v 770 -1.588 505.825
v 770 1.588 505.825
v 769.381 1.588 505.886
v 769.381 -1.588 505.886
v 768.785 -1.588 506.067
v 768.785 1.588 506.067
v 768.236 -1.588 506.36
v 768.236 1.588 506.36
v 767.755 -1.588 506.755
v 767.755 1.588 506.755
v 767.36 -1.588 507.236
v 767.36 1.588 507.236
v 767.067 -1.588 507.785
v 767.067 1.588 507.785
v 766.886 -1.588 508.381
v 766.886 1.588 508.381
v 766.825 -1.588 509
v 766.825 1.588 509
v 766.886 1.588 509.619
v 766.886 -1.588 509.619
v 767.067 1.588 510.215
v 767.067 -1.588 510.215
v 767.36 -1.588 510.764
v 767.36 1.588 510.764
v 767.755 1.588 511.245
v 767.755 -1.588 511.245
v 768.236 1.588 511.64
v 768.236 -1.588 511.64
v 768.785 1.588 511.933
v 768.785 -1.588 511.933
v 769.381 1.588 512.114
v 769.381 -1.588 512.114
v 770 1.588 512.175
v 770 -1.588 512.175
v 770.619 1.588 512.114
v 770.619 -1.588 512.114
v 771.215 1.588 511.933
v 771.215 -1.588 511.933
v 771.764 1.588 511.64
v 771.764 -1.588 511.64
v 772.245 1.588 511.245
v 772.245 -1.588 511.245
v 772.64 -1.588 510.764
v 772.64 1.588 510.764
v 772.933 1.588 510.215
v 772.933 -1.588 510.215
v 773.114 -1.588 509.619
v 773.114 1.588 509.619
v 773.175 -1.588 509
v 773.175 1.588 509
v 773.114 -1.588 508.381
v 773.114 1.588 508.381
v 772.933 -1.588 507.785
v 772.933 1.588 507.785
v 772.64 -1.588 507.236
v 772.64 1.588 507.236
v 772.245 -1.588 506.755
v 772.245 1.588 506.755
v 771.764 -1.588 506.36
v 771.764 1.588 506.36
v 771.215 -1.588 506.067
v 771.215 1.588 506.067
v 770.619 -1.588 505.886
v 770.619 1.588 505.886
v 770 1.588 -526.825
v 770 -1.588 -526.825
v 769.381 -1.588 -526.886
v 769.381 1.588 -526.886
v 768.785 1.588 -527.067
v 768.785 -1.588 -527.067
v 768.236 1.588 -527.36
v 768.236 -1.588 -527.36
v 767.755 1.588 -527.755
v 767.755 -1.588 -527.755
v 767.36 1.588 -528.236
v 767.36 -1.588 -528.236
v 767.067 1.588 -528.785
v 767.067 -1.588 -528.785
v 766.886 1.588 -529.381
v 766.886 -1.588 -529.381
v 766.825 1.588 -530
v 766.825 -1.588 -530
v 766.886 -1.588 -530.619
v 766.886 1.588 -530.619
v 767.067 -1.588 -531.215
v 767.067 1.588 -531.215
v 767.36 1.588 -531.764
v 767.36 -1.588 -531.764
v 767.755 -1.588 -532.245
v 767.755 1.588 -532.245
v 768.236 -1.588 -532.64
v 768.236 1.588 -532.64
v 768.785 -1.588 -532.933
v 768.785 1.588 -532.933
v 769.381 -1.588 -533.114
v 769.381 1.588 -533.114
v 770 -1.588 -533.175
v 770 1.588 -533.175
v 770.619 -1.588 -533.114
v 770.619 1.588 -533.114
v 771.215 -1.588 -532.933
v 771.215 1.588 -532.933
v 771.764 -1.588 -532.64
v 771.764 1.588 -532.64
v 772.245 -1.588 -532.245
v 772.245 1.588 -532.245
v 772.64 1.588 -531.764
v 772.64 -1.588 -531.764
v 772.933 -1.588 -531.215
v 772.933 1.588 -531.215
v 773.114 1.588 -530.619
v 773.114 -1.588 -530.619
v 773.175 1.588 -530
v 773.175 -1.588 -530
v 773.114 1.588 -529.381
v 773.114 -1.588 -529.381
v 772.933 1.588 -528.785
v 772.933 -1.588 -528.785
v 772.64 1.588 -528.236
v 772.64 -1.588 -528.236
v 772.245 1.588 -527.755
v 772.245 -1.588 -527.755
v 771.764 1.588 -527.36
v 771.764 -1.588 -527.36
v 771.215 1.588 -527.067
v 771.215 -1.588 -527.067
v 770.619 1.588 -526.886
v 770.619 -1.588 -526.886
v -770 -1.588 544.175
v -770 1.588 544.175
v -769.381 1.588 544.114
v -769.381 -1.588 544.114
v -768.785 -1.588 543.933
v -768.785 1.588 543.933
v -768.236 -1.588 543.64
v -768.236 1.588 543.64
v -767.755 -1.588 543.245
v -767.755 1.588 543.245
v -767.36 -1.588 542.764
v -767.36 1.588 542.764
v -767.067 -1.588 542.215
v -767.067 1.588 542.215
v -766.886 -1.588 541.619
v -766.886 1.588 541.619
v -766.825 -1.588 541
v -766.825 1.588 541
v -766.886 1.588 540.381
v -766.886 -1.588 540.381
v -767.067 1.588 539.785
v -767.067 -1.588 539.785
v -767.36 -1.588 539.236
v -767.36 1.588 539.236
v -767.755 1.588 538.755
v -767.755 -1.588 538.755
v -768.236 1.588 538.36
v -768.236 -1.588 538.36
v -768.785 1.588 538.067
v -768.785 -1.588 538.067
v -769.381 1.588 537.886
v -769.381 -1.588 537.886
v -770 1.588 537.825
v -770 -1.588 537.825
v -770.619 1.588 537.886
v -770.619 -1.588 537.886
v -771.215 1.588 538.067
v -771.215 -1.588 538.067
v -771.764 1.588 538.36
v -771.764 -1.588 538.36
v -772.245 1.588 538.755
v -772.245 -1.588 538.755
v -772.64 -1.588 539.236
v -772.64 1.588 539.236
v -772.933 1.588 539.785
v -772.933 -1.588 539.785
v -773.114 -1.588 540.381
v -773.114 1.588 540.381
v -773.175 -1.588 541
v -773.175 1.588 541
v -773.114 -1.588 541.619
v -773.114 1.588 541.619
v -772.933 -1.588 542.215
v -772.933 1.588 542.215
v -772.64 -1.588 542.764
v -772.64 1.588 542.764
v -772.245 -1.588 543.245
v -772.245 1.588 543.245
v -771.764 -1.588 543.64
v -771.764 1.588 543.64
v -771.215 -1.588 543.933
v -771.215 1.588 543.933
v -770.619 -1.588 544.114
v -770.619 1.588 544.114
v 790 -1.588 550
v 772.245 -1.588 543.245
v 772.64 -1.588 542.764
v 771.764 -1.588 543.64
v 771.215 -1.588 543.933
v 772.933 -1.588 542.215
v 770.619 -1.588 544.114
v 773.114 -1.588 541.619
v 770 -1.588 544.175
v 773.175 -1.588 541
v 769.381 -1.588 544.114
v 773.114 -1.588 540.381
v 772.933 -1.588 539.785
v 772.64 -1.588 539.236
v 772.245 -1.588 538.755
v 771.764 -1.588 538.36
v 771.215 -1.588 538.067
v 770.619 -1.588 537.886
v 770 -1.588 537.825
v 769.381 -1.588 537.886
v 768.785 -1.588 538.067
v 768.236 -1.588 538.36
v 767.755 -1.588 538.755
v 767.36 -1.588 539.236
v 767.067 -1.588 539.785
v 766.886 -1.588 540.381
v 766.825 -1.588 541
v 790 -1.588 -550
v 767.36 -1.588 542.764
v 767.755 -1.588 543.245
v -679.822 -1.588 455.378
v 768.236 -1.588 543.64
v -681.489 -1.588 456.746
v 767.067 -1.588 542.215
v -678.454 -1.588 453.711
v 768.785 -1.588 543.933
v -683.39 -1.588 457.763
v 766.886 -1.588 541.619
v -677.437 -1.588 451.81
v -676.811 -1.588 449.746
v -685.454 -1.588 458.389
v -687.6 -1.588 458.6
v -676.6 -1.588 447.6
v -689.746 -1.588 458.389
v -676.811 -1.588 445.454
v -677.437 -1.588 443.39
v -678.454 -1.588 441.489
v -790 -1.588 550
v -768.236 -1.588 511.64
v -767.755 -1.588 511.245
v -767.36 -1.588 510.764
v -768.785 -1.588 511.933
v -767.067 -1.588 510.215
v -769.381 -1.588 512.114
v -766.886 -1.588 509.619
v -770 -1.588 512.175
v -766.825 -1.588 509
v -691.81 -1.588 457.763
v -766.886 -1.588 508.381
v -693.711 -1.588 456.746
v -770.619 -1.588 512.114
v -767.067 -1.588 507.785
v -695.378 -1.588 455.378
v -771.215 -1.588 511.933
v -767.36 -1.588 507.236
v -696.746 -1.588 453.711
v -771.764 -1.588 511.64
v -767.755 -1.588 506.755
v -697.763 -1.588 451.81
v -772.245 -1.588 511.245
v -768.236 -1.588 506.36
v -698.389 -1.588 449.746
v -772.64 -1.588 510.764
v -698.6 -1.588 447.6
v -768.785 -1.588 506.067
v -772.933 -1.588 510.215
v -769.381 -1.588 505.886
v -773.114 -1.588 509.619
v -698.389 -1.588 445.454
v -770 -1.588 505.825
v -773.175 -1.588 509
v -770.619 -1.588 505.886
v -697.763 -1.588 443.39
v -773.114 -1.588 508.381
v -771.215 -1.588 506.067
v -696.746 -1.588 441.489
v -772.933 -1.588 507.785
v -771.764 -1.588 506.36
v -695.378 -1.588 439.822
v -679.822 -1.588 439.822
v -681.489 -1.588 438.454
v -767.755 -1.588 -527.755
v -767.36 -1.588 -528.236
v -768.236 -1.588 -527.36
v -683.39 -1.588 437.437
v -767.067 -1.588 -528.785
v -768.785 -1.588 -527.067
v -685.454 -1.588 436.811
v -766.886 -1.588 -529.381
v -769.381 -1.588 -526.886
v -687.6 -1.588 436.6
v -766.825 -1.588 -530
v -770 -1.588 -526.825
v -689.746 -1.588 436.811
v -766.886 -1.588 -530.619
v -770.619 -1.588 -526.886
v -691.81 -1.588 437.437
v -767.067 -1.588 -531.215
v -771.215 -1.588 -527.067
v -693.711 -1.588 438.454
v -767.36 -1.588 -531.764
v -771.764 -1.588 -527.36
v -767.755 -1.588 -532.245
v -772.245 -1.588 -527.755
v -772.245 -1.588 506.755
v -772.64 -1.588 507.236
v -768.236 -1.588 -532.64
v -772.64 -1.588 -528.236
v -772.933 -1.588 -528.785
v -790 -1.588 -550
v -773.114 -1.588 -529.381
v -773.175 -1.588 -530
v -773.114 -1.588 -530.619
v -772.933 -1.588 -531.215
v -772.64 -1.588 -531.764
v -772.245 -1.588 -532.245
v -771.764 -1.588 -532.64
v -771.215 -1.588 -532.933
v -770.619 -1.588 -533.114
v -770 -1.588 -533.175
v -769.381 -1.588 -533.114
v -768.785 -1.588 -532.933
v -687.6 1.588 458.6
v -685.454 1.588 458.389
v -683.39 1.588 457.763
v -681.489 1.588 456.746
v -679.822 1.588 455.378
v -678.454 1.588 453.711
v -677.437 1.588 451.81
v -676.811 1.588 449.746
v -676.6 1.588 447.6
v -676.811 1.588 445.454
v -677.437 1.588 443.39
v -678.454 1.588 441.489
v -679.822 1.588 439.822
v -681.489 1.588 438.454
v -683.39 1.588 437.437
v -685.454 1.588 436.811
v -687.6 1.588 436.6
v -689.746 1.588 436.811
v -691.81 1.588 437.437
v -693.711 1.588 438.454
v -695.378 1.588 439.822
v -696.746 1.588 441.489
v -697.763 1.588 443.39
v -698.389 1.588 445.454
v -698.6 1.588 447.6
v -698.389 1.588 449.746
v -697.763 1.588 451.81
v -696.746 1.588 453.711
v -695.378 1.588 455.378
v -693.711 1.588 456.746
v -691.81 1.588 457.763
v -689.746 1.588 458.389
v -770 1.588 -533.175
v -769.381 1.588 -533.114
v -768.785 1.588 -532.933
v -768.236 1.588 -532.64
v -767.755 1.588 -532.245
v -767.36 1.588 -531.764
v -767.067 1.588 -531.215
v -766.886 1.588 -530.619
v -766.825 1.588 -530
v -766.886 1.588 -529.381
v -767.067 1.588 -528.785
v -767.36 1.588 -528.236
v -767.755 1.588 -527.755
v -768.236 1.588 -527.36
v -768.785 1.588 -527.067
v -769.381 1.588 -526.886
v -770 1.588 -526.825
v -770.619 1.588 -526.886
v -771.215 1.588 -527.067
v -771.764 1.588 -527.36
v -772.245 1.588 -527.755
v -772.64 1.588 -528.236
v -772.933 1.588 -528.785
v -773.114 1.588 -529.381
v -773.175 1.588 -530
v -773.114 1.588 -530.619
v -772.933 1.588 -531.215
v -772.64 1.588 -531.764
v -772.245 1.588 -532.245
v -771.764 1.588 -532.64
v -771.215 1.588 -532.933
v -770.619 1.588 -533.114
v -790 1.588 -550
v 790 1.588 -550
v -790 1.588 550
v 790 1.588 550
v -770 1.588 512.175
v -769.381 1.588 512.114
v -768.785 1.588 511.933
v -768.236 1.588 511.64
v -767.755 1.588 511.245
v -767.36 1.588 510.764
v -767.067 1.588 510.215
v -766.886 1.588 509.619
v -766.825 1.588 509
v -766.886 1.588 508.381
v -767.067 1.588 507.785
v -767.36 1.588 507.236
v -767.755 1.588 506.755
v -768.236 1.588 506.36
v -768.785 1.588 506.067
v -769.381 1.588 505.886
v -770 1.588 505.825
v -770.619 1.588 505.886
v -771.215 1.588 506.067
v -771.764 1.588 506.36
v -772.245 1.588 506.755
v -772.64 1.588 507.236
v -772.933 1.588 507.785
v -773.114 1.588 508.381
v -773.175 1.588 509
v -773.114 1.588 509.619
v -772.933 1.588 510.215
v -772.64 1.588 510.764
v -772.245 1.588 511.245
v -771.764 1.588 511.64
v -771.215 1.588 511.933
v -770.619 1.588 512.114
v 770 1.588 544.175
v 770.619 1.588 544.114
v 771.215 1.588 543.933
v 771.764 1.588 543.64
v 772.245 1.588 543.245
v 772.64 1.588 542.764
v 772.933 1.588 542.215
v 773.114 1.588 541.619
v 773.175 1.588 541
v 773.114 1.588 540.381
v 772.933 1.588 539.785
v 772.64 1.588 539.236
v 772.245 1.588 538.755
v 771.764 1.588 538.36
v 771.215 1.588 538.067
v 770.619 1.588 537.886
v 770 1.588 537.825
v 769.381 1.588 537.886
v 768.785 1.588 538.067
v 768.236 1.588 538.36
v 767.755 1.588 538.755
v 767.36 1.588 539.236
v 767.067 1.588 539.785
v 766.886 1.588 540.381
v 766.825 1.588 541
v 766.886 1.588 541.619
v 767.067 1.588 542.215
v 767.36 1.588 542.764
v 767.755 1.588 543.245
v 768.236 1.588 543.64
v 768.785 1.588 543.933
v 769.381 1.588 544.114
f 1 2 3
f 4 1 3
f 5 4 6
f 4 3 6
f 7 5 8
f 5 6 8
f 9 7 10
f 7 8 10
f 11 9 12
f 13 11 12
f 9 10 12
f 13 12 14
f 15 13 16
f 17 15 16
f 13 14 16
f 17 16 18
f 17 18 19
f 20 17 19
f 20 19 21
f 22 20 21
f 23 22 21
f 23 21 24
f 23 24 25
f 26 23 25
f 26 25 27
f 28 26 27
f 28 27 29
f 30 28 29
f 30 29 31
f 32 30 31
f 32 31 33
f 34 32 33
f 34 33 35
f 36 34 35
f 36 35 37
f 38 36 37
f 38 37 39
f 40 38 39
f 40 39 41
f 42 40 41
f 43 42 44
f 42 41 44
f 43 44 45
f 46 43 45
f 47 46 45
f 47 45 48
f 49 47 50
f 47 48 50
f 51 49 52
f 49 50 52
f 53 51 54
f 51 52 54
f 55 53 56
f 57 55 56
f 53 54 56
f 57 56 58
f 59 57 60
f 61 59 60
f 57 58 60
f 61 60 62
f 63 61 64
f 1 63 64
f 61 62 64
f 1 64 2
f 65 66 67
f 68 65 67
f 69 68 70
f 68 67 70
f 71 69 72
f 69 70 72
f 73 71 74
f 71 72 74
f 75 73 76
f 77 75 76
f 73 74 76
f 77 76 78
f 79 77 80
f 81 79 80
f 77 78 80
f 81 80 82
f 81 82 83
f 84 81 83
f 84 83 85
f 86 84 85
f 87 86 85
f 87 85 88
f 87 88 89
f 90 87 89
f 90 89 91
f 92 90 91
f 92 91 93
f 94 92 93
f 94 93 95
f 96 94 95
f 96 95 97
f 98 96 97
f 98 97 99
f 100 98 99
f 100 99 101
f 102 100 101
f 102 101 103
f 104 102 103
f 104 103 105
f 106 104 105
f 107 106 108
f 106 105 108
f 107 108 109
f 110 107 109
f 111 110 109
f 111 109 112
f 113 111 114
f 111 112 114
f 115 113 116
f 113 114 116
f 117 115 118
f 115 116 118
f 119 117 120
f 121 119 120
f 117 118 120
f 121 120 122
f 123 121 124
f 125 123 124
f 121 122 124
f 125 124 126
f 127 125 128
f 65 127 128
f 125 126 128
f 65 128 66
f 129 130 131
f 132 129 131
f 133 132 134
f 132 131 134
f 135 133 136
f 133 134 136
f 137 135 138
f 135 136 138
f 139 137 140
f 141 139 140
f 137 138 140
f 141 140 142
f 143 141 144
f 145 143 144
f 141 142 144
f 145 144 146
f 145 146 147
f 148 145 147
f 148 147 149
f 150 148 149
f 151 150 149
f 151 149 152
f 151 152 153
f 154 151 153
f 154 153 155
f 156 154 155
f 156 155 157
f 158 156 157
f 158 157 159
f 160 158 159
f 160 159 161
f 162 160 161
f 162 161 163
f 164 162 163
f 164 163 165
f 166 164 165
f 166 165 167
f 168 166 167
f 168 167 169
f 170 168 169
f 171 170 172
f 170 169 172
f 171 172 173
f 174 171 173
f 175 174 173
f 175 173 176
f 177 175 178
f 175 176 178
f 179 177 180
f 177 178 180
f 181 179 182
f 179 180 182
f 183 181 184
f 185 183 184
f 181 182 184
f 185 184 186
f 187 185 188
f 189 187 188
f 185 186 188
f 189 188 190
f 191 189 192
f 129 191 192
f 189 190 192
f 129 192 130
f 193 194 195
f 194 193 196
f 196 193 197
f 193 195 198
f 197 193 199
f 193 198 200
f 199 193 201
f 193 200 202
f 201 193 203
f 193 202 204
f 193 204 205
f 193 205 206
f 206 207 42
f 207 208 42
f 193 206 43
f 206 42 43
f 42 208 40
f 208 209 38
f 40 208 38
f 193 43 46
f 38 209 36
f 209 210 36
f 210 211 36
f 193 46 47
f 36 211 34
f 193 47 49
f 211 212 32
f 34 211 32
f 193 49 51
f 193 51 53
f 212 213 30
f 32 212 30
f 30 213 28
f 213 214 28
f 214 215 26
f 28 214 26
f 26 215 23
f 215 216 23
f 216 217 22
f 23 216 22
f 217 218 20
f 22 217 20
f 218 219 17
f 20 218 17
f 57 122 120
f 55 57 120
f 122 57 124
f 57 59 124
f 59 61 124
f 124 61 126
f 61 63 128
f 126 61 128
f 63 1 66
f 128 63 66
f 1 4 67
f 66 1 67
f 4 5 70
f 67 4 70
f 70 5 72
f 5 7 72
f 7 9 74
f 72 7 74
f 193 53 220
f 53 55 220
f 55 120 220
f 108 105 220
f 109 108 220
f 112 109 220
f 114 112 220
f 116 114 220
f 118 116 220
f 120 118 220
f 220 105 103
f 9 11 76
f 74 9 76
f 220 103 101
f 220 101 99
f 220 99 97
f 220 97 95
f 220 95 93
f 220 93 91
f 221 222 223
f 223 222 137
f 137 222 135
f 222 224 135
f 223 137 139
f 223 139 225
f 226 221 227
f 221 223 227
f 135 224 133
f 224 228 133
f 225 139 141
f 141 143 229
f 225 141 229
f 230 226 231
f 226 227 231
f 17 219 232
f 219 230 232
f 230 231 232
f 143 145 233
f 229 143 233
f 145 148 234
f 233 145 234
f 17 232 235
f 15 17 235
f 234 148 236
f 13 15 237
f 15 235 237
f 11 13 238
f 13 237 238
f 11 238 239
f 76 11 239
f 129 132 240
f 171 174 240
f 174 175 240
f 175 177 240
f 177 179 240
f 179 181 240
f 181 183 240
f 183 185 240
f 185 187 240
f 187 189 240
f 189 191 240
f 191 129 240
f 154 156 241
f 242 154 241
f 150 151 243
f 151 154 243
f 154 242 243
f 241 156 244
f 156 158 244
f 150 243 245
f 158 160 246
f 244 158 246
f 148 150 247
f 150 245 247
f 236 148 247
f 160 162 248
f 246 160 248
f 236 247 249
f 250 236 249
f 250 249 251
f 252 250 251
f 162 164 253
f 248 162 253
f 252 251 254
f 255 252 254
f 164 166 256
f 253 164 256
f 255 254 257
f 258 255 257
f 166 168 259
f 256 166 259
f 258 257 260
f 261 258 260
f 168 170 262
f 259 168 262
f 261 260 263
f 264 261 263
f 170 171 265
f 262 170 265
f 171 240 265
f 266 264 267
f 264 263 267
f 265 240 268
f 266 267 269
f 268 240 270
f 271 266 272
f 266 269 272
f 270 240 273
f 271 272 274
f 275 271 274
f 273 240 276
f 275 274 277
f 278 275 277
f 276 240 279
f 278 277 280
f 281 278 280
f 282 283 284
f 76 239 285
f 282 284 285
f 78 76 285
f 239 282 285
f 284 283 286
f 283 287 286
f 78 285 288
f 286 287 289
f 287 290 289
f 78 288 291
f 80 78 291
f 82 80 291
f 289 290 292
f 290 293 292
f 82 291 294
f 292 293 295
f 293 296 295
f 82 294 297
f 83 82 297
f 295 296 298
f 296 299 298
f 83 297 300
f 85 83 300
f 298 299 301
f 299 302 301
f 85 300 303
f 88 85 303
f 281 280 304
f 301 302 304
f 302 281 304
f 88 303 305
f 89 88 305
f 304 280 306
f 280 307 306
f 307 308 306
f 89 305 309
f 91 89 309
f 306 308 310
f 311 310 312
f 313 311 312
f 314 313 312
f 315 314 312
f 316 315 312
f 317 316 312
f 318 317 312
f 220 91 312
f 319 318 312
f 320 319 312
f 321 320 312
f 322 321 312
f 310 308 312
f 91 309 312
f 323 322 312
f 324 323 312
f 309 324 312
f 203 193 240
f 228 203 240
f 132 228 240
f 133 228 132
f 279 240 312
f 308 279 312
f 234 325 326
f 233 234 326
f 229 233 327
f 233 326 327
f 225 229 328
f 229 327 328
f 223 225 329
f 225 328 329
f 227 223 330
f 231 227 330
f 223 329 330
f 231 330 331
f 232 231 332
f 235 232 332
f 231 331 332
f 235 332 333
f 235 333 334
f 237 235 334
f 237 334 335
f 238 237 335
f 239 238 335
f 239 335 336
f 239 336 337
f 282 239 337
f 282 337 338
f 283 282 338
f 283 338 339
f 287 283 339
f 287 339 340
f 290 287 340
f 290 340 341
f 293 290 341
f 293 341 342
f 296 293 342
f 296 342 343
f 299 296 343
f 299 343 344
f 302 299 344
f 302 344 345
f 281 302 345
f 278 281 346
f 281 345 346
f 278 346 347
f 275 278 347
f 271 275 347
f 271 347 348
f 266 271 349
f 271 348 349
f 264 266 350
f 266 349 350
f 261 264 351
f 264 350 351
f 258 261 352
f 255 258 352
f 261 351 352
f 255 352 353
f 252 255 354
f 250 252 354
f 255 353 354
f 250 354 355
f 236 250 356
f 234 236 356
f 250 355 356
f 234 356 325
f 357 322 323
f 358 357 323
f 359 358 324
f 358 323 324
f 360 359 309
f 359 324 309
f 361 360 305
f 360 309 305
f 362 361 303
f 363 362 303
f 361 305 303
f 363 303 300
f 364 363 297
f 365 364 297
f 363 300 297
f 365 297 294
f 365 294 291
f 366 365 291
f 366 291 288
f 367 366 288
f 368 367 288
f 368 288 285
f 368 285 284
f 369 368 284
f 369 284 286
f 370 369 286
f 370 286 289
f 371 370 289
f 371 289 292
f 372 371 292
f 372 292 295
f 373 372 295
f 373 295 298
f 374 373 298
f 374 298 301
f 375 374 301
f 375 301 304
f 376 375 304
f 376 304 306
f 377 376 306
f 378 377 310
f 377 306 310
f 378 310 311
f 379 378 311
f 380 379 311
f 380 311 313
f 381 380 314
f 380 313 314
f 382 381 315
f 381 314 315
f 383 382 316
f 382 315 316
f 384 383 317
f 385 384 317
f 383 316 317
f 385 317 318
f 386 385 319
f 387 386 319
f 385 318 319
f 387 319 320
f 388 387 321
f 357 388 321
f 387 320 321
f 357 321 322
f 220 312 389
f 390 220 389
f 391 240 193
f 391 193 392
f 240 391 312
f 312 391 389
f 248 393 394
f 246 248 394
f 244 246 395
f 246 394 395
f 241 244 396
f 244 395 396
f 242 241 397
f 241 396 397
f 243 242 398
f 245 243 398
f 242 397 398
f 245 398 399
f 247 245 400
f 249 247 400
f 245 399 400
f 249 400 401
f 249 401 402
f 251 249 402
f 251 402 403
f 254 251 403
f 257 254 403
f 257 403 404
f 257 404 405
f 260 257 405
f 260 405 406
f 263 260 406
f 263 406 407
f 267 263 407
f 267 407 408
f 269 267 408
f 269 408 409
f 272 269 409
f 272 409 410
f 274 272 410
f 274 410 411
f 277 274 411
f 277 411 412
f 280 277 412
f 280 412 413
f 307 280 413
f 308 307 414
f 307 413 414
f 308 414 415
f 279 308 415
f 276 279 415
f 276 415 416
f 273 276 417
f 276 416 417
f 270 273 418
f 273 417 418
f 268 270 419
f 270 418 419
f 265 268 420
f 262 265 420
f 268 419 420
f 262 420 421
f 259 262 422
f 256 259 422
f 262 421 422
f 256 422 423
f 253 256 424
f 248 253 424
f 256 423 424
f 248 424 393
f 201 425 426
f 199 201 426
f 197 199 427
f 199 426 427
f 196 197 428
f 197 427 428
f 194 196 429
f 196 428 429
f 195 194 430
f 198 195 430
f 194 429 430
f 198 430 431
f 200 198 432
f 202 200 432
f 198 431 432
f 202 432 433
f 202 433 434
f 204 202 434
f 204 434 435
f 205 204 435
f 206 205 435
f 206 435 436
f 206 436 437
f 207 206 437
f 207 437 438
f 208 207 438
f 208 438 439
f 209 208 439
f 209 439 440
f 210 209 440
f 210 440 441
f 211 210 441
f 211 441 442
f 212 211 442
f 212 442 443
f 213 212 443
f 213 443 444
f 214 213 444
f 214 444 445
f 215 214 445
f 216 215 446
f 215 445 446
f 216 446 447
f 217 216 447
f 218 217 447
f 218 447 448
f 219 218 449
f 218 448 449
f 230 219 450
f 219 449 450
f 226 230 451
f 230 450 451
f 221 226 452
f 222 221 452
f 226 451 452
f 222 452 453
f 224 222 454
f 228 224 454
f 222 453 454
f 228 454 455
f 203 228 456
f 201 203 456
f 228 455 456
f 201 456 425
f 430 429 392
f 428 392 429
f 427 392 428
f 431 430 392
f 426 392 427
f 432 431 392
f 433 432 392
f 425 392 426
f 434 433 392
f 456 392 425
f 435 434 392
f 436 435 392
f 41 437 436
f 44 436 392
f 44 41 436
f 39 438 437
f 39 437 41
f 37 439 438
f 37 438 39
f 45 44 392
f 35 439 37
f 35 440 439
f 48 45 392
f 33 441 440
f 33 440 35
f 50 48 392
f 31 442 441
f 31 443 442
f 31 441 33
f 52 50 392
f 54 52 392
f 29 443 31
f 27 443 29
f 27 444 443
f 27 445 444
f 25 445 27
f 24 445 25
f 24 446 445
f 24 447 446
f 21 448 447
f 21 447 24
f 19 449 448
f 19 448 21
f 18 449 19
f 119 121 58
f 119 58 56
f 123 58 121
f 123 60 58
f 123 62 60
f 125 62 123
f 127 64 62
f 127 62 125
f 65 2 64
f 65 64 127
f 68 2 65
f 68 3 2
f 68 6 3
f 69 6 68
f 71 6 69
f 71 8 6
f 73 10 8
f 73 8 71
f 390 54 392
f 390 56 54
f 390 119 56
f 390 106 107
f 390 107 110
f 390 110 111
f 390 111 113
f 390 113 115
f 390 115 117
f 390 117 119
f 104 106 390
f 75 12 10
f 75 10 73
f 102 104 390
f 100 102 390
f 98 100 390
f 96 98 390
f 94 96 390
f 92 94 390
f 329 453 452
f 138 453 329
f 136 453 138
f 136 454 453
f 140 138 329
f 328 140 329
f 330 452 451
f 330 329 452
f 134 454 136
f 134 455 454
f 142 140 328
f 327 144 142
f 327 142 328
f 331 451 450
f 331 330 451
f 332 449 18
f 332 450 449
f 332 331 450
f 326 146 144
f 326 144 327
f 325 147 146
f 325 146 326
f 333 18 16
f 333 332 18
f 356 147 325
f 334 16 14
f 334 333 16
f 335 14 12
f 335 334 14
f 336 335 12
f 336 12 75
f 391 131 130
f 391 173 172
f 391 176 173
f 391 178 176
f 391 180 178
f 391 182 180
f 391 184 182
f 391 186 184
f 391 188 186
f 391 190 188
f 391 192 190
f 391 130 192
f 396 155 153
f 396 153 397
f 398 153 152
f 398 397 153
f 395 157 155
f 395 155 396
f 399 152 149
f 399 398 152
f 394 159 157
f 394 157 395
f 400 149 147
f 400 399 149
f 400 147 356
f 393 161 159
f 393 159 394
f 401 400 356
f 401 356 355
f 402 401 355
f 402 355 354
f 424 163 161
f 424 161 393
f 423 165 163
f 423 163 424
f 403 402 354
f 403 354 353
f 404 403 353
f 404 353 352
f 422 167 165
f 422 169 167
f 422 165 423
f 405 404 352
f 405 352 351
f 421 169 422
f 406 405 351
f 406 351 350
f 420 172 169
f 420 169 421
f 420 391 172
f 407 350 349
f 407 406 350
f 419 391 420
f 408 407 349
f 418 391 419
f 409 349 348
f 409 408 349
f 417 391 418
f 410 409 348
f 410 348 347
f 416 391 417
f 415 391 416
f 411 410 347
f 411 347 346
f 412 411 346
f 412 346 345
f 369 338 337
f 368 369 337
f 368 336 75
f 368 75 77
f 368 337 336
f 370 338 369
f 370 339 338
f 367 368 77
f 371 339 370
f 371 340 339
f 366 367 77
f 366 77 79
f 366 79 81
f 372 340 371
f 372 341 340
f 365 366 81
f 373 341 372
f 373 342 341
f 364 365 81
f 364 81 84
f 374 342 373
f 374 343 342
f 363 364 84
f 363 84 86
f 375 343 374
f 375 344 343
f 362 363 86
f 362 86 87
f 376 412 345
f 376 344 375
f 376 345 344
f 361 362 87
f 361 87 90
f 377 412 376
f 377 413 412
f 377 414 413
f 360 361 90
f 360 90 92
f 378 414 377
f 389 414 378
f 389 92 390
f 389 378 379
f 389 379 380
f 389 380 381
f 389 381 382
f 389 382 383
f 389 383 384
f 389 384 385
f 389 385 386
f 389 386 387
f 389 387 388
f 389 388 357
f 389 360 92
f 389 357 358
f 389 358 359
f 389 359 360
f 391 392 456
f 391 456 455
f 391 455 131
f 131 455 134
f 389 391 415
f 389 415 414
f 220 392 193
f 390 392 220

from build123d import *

# Parameters (mm, degrees)
BOSS_EXTRUDE1_DEPTH      = 790
BOSS_EXTRUDE1_DEPTH_BACK = 790
SKETCH3_W                = 1100
SKETCH3_H                = 3.175
SKETCH4_R                = 11
CUT_EXTRUDE1_DEPTH       = 10
SKETCH5_R                = 3.175
CUT_EXTRUDE2_DEPTH       = 10
SKETCH6_R                = 3.175
CUT_EXTRUDE3_DEPTH       = 10


with BuildPart() as part:
    # Sketch3 → Boss-Extrude1 (new, two sides: drawn at the far end of the back side and taken through both)
    with BuildSketch(Plane(origin=(0, 0, 0), x_dir=(0, 0, -1), z_dir=(1, 0, 0)).offset(-BOSS_EXTRUDE1_DEPTH_BACK)):
        Rectangle(SKETCH3_W, SKETCH3_H)
    extrude(amount=BOSS_EXTRUDE1_DEPTH + BOSS_EXTRUDE1_DEPTH_BACK)

    # Sketch4 → Cut-Extrude1 (cut)
    with BuildSketch(Plane(origin=(0, 1.5875, 0), x_dir=(1, 0, 0), z_dir=(0, 1, 0))):
        with Locations(Location((-687.6, -447.6, 0), (0, 0, 270))):
            Circle(SKETCH4_R)
    extrude(amount=-CUT_EXTRUDE1_DEPTH, mode=Mode.SUBTRACT)

    # Sketch5 → Cut-Extrude2 (cut)
    with BuildSketch(Plane(origin=(0, -1.5875, 0), x_dir=(-1, 0, 0), z_dir=(0, -1, 0))):
        with Locations(Location((770, 530, 0), (0, 0, 90))):
            Circle(SKETCH5_R)
        with Locations(Location((-770, 530, 0), (0, 0, 270))):
            Circle(SKETCH5_R)
    extrude(amount=-CUT_EXTRUDE2_DEPTH, mode=Mode.SUBTRACT)

    # Sketch6 → Cut-Extrude3 (cut)
    with BuildSketch(Plane(origin=(0, 1.5875, 0), x_dir=(1, 0, 0), z_dir=(0, 1, 0))):
        with Locations(Location((-770, -509, 0), (0, 0, 270))):
            Circle(SKETCH6_R)
        with Locations(Location((-770, -541, 0), (0, 0, 270))):
            Circle(SKETCH6_R)
        with Locations(Location((770, -541, 0), (0, 0, 270))):
            Circle(SKETCH6_R)
        with Locations(Location((770, -509, 0), (0, 0, 90))):
            Circle(SKETCH6_R)
    extrude(amount=-CUT_EXTRUDE3_DEPTH, mode=Mode.SUBTRACT)


solid = part.part
